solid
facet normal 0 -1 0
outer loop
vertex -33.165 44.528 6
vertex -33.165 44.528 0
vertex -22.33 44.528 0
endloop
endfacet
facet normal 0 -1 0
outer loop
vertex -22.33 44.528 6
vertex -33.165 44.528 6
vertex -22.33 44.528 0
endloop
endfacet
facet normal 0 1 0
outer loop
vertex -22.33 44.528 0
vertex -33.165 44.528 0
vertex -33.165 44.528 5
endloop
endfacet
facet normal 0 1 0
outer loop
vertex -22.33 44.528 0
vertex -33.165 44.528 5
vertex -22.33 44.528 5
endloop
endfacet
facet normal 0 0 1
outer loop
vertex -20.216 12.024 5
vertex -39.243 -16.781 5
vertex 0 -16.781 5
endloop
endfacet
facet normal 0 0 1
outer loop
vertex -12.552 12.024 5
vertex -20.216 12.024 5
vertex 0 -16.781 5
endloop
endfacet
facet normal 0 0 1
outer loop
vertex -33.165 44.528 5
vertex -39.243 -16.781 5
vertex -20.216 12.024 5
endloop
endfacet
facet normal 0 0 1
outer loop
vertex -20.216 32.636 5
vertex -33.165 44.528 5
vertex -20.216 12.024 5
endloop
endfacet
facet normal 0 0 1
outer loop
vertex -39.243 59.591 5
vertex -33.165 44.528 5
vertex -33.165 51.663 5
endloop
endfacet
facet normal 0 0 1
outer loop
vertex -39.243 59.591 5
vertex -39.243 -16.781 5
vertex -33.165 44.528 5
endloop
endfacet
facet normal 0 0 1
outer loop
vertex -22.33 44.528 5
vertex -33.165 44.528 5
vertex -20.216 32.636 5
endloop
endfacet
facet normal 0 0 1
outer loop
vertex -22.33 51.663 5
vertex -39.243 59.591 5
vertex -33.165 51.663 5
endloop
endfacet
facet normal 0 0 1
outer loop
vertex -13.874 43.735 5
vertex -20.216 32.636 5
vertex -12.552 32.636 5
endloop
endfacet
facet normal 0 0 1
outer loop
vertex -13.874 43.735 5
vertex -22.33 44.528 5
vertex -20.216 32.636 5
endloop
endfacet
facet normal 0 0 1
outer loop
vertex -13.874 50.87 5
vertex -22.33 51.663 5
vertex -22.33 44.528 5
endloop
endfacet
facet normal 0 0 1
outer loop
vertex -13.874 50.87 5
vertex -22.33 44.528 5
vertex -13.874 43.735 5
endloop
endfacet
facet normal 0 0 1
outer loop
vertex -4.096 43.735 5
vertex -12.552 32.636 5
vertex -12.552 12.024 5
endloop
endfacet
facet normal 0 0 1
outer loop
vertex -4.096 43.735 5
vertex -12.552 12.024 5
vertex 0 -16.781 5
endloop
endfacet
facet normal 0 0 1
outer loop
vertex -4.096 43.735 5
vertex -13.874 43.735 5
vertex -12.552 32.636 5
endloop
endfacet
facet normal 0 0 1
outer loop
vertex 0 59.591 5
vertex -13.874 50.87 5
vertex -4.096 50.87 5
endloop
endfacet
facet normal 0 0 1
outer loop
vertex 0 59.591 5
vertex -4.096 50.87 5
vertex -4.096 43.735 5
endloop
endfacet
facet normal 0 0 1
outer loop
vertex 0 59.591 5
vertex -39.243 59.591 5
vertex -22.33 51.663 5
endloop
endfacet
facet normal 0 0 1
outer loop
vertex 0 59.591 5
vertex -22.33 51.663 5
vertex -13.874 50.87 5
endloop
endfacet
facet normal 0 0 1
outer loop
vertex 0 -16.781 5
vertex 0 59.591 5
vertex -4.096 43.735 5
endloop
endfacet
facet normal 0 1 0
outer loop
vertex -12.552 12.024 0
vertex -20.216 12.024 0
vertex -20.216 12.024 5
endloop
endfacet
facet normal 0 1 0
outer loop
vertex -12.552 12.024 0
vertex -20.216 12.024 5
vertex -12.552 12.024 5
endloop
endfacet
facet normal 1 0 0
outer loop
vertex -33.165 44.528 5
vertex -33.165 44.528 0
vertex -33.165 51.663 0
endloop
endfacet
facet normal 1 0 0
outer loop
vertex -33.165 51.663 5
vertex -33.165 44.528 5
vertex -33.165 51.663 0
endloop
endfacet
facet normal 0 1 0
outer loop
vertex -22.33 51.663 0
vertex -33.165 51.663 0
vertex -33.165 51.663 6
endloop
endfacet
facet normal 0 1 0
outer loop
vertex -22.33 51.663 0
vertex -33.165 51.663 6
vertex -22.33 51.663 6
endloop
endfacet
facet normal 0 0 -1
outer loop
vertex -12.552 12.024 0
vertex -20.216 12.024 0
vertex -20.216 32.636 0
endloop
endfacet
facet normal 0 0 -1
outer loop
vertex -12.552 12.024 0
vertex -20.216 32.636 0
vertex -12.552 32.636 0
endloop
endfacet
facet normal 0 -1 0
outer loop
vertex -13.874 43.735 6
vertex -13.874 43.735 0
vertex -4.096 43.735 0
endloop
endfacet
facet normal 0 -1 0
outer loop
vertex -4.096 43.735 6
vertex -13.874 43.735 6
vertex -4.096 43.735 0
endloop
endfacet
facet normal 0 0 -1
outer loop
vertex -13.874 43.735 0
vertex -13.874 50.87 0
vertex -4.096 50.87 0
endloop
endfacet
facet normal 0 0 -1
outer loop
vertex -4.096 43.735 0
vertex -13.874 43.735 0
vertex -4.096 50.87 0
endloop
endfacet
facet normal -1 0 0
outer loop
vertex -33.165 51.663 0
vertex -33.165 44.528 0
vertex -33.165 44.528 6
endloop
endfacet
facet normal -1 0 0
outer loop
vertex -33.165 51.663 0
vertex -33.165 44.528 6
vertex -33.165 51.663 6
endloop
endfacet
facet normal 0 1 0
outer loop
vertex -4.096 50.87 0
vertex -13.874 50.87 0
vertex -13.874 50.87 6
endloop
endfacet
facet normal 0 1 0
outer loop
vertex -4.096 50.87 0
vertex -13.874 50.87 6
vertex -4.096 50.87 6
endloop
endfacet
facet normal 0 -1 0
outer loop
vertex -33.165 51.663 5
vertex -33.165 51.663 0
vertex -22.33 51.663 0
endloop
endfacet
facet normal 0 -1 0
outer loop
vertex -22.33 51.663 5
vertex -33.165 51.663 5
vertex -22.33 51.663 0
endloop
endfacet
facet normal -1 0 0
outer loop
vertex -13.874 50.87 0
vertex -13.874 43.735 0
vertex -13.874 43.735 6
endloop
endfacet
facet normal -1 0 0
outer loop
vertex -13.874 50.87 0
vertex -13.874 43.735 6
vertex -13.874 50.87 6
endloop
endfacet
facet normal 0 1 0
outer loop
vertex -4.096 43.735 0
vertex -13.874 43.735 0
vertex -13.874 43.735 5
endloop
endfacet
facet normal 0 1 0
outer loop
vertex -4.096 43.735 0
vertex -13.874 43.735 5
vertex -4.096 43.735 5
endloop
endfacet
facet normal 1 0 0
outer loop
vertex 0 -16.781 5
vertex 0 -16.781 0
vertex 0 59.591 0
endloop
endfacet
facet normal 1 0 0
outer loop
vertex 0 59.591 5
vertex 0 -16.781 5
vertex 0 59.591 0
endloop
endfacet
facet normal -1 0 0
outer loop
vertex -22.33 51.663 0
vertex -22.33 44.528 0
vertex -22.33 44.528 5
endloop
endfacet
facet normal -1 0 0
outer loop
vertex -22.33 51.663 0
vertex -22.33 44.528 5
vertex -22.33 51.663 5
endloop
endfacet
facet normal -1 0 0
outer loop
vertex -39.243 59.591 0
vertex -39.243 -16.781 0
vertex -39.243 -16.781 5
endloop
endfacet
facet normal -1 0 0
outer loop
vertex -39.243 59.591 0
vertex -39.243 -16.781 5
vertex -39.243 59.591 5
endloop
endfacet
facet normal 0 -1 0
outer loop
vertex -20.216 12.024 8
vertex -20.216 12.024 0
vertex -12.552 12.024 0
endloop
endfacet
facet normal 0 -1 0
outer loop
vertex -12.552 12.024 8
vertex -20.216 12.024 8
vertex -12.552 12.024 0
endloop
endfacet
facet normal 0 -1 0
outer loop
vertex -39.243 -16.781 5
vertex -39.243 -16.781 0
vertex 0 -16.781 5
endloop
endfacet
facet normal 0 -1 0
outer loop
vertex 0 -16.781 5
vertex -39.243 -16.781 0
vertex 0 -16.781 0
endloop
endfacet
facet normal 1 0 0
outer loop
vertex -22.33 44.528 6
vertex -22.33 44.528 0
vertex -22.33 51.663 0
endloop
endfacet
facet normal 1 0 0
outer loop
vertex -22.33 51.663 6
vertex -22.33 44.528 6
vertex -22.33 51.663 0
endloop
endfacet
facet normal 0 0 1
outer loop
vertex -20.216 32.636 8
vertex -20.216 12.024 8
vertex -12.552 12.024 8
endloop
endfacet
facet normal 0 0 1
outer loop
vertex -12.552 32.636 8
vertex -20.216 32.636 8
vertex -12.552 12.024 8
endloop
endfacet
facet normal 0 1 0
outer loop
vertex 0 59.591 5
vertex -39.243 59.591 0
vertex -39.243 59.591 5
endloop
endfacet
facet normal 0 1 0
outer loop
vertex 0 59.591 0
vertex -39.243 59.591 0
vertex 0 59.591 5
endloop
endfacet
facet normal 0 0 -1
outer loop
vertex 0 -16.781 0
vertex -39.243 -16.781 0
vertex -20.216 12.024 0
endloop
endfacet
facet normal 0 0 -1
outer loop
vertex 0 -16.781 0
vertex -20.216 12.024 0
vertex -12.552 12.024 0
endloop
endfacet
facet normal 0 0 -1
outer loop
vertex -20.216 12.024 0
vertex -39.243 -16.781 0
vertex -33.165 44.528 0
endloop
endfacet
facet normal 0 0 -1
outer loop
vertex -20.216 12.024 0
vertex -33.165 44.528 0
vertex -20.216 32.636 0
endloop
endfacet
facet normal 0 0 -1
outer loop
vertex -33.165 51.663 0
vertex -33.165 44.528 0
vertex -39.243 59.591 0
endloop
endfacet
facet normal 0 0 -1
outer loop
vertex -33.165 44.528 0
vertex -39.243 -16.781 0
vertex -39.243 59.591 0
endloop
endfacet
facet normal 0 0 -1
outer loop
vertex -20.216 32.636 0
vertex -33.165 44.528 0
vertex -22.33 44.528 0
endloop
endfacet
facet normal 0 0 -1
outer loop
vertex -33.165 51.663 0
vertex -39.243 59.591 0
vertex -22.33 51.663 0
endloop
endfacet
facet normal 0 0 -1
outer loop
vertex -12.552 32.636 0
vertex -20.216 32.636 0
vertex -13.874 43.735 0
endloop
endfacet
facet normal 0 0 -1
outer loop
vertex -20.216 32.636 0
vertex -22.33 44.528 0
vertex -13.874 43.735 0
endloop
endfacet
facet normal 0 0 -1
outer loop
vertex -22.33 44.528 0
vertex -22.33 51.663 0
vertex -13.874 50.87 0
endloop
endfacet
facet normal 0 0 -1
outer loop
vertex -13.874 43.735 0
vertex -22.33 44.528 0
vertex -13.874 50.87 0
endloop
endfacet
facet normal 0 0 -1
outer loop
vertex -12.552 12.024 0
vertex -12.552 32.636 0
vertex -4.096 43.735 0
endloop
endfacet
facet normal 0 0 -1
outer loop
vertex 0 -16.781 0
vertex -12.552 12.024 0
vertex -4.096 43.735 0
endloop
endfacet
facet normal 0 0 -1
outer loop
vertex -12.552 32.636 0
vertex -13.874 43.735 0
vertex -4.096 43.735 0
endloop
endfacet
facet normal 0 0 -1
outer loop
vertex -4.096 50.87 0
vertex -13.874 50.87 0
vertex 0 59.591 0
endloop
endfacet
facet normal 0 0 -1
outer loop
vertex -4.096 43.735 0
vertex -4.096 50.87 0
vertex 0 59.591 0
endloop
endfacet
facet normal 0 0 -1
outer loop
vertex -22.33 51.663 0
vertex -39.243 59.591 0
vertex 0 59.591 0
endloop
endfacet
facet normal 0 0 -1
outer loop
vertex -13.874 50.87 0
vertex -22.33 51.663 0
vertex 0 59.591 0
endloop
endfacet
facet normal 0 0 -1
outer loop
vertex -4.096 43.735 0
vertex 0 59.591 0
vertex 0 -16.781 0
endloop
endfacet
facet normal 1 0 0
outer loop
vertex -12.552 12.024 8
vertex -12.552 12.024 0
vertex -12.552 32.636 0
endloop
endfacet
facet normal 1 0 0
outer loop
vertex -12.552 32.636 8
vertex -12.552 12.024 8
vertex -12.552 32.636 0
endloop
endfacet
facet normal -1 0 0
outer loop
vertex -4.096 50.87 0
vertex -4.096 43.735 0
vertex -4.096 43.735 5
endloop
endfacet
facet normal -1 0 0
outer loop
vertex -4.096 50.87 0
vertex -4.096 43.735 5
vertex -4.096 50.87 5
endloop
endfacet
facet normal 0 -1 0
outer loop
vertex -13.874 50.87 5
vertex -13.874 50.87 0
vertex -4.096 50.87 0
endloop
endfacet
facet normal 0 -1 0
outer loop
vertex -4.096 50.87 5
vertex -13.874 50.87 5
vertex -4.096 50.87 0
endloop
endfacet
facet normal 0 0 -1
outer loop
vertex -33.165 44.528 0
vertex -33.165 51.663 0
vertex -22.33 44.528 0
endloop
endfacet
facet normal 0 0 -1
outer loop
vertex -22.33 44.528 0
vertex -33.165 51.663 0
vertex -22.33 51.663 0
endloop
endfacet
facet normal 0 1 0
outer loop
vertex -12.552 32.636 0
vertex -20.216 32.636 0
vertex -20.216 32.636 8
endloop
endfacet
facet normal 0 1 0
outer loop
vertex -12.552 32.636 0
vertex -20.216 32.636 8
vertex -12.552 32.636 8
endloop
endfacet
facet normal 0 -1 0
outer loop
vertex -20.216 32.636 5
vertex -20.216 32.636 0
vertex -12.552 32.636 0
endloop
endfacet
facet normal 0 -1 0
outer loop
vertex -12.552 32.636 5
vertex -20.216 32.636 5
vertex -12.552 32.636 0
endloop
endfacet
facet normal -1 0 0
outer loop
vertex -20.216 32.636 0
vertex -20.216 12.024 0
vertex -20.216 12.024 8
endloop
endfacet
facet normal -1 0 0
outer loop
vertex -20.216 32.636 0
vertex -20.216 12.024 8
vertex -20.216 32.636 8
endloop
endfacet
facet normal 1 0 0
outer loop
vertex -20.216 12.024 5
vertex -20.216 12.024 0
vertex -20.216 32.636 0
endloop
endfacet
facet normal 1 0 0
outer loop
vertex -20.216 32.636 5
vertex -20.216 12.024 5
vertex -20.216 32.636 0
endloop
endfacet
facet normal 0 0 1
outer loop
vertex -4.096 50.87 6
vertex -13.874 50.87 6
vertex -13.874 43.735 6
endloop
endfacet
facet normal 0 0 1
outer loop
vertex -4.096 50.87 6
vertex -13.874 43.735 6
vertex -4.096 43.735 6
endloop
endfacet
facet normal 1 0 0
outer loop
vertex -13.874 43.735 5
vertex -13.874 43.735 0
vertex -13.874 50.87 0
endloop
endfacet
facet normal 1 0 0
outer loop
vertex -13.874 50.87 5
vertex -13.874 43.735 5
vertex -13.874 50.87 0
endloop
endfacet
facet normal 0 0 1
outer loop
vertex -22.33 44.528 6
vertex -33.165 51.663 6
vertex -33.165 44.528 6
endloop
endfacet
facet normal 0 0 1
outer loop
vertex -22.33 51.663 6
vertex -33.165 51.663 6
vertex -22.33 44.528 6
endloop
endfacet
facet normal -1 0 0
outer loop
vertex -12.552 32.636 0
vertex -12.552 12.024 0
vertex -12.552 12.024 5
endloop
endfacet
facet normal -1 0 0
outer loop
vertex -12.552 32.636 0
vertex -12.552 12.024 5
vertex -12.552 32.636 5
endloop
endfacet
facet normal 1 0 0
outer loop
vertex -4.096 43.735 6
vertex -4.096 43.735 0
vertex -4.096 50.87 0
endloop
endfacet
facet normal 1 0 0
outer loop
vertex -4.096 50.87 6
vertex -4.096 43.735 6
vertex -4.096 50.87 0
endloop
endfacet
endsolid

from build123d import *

# Parameters (mm, degrees)
F0_W     = 7.66359
F0_H     = 20.612416
F1_DEPTH = 8
F0_W_2   = 10.834733
F0_H_2   = 7.135067
F0_W_3   = 9.777686
F2_DEPTH = 6
F0_W_4   = 39.242871
F0_H_3   = 76.371645
F3_DEPTH = 5


with BuildPart() as f1:
    # F0 (on Top) → F1 (new body)
    with BuildSketch(Plane.XY):
        with Locations((-16.384229, 22.330118)):
            Rectangle(F0_W, F0_H)
    extrude(amount=F1_DEPTH)


with BuildPart() as f2:
    # F0 (on Top) → F2 (new body)
    with BuildSketch(Plane.XY):
        with Locations((-27.747484, 48.095637)):
            Rectangle(F0_W_2, F0_H_2)
        with Locations((-8.9849, 47.302855)):
            Rectangle(F0_W_3, F0_H_2)
    extrude(amount=F2_DEPTH)


with BuildPart() as f3:
    # F0 (on Top) → F3 (new body)
    with BuildSketch(Plane.XY):
        with Locations((-19.621436, 21.405202)):
            Rectangle(F0_W_4, F0_H_3)
        with Locations((-27.747484, 48.095637)):
            Rectangle(F0_W_2, F0_H_2, mode=Mode.SUBTRACT)
        with Locations((-16.384229, 22.330118)):
            Rectangle(F0_W, F0_H, mode=Mode.SUBTRACT)
        with Locations((-8.9849, 47.302855)):
            Rectangle(F0_W_3, F0_H_2, mode=Mode.SUBTRACT)
    extrude(amount=F3_DEPTH)


solid = Compound([f1.part, f2.part, f3.part])
